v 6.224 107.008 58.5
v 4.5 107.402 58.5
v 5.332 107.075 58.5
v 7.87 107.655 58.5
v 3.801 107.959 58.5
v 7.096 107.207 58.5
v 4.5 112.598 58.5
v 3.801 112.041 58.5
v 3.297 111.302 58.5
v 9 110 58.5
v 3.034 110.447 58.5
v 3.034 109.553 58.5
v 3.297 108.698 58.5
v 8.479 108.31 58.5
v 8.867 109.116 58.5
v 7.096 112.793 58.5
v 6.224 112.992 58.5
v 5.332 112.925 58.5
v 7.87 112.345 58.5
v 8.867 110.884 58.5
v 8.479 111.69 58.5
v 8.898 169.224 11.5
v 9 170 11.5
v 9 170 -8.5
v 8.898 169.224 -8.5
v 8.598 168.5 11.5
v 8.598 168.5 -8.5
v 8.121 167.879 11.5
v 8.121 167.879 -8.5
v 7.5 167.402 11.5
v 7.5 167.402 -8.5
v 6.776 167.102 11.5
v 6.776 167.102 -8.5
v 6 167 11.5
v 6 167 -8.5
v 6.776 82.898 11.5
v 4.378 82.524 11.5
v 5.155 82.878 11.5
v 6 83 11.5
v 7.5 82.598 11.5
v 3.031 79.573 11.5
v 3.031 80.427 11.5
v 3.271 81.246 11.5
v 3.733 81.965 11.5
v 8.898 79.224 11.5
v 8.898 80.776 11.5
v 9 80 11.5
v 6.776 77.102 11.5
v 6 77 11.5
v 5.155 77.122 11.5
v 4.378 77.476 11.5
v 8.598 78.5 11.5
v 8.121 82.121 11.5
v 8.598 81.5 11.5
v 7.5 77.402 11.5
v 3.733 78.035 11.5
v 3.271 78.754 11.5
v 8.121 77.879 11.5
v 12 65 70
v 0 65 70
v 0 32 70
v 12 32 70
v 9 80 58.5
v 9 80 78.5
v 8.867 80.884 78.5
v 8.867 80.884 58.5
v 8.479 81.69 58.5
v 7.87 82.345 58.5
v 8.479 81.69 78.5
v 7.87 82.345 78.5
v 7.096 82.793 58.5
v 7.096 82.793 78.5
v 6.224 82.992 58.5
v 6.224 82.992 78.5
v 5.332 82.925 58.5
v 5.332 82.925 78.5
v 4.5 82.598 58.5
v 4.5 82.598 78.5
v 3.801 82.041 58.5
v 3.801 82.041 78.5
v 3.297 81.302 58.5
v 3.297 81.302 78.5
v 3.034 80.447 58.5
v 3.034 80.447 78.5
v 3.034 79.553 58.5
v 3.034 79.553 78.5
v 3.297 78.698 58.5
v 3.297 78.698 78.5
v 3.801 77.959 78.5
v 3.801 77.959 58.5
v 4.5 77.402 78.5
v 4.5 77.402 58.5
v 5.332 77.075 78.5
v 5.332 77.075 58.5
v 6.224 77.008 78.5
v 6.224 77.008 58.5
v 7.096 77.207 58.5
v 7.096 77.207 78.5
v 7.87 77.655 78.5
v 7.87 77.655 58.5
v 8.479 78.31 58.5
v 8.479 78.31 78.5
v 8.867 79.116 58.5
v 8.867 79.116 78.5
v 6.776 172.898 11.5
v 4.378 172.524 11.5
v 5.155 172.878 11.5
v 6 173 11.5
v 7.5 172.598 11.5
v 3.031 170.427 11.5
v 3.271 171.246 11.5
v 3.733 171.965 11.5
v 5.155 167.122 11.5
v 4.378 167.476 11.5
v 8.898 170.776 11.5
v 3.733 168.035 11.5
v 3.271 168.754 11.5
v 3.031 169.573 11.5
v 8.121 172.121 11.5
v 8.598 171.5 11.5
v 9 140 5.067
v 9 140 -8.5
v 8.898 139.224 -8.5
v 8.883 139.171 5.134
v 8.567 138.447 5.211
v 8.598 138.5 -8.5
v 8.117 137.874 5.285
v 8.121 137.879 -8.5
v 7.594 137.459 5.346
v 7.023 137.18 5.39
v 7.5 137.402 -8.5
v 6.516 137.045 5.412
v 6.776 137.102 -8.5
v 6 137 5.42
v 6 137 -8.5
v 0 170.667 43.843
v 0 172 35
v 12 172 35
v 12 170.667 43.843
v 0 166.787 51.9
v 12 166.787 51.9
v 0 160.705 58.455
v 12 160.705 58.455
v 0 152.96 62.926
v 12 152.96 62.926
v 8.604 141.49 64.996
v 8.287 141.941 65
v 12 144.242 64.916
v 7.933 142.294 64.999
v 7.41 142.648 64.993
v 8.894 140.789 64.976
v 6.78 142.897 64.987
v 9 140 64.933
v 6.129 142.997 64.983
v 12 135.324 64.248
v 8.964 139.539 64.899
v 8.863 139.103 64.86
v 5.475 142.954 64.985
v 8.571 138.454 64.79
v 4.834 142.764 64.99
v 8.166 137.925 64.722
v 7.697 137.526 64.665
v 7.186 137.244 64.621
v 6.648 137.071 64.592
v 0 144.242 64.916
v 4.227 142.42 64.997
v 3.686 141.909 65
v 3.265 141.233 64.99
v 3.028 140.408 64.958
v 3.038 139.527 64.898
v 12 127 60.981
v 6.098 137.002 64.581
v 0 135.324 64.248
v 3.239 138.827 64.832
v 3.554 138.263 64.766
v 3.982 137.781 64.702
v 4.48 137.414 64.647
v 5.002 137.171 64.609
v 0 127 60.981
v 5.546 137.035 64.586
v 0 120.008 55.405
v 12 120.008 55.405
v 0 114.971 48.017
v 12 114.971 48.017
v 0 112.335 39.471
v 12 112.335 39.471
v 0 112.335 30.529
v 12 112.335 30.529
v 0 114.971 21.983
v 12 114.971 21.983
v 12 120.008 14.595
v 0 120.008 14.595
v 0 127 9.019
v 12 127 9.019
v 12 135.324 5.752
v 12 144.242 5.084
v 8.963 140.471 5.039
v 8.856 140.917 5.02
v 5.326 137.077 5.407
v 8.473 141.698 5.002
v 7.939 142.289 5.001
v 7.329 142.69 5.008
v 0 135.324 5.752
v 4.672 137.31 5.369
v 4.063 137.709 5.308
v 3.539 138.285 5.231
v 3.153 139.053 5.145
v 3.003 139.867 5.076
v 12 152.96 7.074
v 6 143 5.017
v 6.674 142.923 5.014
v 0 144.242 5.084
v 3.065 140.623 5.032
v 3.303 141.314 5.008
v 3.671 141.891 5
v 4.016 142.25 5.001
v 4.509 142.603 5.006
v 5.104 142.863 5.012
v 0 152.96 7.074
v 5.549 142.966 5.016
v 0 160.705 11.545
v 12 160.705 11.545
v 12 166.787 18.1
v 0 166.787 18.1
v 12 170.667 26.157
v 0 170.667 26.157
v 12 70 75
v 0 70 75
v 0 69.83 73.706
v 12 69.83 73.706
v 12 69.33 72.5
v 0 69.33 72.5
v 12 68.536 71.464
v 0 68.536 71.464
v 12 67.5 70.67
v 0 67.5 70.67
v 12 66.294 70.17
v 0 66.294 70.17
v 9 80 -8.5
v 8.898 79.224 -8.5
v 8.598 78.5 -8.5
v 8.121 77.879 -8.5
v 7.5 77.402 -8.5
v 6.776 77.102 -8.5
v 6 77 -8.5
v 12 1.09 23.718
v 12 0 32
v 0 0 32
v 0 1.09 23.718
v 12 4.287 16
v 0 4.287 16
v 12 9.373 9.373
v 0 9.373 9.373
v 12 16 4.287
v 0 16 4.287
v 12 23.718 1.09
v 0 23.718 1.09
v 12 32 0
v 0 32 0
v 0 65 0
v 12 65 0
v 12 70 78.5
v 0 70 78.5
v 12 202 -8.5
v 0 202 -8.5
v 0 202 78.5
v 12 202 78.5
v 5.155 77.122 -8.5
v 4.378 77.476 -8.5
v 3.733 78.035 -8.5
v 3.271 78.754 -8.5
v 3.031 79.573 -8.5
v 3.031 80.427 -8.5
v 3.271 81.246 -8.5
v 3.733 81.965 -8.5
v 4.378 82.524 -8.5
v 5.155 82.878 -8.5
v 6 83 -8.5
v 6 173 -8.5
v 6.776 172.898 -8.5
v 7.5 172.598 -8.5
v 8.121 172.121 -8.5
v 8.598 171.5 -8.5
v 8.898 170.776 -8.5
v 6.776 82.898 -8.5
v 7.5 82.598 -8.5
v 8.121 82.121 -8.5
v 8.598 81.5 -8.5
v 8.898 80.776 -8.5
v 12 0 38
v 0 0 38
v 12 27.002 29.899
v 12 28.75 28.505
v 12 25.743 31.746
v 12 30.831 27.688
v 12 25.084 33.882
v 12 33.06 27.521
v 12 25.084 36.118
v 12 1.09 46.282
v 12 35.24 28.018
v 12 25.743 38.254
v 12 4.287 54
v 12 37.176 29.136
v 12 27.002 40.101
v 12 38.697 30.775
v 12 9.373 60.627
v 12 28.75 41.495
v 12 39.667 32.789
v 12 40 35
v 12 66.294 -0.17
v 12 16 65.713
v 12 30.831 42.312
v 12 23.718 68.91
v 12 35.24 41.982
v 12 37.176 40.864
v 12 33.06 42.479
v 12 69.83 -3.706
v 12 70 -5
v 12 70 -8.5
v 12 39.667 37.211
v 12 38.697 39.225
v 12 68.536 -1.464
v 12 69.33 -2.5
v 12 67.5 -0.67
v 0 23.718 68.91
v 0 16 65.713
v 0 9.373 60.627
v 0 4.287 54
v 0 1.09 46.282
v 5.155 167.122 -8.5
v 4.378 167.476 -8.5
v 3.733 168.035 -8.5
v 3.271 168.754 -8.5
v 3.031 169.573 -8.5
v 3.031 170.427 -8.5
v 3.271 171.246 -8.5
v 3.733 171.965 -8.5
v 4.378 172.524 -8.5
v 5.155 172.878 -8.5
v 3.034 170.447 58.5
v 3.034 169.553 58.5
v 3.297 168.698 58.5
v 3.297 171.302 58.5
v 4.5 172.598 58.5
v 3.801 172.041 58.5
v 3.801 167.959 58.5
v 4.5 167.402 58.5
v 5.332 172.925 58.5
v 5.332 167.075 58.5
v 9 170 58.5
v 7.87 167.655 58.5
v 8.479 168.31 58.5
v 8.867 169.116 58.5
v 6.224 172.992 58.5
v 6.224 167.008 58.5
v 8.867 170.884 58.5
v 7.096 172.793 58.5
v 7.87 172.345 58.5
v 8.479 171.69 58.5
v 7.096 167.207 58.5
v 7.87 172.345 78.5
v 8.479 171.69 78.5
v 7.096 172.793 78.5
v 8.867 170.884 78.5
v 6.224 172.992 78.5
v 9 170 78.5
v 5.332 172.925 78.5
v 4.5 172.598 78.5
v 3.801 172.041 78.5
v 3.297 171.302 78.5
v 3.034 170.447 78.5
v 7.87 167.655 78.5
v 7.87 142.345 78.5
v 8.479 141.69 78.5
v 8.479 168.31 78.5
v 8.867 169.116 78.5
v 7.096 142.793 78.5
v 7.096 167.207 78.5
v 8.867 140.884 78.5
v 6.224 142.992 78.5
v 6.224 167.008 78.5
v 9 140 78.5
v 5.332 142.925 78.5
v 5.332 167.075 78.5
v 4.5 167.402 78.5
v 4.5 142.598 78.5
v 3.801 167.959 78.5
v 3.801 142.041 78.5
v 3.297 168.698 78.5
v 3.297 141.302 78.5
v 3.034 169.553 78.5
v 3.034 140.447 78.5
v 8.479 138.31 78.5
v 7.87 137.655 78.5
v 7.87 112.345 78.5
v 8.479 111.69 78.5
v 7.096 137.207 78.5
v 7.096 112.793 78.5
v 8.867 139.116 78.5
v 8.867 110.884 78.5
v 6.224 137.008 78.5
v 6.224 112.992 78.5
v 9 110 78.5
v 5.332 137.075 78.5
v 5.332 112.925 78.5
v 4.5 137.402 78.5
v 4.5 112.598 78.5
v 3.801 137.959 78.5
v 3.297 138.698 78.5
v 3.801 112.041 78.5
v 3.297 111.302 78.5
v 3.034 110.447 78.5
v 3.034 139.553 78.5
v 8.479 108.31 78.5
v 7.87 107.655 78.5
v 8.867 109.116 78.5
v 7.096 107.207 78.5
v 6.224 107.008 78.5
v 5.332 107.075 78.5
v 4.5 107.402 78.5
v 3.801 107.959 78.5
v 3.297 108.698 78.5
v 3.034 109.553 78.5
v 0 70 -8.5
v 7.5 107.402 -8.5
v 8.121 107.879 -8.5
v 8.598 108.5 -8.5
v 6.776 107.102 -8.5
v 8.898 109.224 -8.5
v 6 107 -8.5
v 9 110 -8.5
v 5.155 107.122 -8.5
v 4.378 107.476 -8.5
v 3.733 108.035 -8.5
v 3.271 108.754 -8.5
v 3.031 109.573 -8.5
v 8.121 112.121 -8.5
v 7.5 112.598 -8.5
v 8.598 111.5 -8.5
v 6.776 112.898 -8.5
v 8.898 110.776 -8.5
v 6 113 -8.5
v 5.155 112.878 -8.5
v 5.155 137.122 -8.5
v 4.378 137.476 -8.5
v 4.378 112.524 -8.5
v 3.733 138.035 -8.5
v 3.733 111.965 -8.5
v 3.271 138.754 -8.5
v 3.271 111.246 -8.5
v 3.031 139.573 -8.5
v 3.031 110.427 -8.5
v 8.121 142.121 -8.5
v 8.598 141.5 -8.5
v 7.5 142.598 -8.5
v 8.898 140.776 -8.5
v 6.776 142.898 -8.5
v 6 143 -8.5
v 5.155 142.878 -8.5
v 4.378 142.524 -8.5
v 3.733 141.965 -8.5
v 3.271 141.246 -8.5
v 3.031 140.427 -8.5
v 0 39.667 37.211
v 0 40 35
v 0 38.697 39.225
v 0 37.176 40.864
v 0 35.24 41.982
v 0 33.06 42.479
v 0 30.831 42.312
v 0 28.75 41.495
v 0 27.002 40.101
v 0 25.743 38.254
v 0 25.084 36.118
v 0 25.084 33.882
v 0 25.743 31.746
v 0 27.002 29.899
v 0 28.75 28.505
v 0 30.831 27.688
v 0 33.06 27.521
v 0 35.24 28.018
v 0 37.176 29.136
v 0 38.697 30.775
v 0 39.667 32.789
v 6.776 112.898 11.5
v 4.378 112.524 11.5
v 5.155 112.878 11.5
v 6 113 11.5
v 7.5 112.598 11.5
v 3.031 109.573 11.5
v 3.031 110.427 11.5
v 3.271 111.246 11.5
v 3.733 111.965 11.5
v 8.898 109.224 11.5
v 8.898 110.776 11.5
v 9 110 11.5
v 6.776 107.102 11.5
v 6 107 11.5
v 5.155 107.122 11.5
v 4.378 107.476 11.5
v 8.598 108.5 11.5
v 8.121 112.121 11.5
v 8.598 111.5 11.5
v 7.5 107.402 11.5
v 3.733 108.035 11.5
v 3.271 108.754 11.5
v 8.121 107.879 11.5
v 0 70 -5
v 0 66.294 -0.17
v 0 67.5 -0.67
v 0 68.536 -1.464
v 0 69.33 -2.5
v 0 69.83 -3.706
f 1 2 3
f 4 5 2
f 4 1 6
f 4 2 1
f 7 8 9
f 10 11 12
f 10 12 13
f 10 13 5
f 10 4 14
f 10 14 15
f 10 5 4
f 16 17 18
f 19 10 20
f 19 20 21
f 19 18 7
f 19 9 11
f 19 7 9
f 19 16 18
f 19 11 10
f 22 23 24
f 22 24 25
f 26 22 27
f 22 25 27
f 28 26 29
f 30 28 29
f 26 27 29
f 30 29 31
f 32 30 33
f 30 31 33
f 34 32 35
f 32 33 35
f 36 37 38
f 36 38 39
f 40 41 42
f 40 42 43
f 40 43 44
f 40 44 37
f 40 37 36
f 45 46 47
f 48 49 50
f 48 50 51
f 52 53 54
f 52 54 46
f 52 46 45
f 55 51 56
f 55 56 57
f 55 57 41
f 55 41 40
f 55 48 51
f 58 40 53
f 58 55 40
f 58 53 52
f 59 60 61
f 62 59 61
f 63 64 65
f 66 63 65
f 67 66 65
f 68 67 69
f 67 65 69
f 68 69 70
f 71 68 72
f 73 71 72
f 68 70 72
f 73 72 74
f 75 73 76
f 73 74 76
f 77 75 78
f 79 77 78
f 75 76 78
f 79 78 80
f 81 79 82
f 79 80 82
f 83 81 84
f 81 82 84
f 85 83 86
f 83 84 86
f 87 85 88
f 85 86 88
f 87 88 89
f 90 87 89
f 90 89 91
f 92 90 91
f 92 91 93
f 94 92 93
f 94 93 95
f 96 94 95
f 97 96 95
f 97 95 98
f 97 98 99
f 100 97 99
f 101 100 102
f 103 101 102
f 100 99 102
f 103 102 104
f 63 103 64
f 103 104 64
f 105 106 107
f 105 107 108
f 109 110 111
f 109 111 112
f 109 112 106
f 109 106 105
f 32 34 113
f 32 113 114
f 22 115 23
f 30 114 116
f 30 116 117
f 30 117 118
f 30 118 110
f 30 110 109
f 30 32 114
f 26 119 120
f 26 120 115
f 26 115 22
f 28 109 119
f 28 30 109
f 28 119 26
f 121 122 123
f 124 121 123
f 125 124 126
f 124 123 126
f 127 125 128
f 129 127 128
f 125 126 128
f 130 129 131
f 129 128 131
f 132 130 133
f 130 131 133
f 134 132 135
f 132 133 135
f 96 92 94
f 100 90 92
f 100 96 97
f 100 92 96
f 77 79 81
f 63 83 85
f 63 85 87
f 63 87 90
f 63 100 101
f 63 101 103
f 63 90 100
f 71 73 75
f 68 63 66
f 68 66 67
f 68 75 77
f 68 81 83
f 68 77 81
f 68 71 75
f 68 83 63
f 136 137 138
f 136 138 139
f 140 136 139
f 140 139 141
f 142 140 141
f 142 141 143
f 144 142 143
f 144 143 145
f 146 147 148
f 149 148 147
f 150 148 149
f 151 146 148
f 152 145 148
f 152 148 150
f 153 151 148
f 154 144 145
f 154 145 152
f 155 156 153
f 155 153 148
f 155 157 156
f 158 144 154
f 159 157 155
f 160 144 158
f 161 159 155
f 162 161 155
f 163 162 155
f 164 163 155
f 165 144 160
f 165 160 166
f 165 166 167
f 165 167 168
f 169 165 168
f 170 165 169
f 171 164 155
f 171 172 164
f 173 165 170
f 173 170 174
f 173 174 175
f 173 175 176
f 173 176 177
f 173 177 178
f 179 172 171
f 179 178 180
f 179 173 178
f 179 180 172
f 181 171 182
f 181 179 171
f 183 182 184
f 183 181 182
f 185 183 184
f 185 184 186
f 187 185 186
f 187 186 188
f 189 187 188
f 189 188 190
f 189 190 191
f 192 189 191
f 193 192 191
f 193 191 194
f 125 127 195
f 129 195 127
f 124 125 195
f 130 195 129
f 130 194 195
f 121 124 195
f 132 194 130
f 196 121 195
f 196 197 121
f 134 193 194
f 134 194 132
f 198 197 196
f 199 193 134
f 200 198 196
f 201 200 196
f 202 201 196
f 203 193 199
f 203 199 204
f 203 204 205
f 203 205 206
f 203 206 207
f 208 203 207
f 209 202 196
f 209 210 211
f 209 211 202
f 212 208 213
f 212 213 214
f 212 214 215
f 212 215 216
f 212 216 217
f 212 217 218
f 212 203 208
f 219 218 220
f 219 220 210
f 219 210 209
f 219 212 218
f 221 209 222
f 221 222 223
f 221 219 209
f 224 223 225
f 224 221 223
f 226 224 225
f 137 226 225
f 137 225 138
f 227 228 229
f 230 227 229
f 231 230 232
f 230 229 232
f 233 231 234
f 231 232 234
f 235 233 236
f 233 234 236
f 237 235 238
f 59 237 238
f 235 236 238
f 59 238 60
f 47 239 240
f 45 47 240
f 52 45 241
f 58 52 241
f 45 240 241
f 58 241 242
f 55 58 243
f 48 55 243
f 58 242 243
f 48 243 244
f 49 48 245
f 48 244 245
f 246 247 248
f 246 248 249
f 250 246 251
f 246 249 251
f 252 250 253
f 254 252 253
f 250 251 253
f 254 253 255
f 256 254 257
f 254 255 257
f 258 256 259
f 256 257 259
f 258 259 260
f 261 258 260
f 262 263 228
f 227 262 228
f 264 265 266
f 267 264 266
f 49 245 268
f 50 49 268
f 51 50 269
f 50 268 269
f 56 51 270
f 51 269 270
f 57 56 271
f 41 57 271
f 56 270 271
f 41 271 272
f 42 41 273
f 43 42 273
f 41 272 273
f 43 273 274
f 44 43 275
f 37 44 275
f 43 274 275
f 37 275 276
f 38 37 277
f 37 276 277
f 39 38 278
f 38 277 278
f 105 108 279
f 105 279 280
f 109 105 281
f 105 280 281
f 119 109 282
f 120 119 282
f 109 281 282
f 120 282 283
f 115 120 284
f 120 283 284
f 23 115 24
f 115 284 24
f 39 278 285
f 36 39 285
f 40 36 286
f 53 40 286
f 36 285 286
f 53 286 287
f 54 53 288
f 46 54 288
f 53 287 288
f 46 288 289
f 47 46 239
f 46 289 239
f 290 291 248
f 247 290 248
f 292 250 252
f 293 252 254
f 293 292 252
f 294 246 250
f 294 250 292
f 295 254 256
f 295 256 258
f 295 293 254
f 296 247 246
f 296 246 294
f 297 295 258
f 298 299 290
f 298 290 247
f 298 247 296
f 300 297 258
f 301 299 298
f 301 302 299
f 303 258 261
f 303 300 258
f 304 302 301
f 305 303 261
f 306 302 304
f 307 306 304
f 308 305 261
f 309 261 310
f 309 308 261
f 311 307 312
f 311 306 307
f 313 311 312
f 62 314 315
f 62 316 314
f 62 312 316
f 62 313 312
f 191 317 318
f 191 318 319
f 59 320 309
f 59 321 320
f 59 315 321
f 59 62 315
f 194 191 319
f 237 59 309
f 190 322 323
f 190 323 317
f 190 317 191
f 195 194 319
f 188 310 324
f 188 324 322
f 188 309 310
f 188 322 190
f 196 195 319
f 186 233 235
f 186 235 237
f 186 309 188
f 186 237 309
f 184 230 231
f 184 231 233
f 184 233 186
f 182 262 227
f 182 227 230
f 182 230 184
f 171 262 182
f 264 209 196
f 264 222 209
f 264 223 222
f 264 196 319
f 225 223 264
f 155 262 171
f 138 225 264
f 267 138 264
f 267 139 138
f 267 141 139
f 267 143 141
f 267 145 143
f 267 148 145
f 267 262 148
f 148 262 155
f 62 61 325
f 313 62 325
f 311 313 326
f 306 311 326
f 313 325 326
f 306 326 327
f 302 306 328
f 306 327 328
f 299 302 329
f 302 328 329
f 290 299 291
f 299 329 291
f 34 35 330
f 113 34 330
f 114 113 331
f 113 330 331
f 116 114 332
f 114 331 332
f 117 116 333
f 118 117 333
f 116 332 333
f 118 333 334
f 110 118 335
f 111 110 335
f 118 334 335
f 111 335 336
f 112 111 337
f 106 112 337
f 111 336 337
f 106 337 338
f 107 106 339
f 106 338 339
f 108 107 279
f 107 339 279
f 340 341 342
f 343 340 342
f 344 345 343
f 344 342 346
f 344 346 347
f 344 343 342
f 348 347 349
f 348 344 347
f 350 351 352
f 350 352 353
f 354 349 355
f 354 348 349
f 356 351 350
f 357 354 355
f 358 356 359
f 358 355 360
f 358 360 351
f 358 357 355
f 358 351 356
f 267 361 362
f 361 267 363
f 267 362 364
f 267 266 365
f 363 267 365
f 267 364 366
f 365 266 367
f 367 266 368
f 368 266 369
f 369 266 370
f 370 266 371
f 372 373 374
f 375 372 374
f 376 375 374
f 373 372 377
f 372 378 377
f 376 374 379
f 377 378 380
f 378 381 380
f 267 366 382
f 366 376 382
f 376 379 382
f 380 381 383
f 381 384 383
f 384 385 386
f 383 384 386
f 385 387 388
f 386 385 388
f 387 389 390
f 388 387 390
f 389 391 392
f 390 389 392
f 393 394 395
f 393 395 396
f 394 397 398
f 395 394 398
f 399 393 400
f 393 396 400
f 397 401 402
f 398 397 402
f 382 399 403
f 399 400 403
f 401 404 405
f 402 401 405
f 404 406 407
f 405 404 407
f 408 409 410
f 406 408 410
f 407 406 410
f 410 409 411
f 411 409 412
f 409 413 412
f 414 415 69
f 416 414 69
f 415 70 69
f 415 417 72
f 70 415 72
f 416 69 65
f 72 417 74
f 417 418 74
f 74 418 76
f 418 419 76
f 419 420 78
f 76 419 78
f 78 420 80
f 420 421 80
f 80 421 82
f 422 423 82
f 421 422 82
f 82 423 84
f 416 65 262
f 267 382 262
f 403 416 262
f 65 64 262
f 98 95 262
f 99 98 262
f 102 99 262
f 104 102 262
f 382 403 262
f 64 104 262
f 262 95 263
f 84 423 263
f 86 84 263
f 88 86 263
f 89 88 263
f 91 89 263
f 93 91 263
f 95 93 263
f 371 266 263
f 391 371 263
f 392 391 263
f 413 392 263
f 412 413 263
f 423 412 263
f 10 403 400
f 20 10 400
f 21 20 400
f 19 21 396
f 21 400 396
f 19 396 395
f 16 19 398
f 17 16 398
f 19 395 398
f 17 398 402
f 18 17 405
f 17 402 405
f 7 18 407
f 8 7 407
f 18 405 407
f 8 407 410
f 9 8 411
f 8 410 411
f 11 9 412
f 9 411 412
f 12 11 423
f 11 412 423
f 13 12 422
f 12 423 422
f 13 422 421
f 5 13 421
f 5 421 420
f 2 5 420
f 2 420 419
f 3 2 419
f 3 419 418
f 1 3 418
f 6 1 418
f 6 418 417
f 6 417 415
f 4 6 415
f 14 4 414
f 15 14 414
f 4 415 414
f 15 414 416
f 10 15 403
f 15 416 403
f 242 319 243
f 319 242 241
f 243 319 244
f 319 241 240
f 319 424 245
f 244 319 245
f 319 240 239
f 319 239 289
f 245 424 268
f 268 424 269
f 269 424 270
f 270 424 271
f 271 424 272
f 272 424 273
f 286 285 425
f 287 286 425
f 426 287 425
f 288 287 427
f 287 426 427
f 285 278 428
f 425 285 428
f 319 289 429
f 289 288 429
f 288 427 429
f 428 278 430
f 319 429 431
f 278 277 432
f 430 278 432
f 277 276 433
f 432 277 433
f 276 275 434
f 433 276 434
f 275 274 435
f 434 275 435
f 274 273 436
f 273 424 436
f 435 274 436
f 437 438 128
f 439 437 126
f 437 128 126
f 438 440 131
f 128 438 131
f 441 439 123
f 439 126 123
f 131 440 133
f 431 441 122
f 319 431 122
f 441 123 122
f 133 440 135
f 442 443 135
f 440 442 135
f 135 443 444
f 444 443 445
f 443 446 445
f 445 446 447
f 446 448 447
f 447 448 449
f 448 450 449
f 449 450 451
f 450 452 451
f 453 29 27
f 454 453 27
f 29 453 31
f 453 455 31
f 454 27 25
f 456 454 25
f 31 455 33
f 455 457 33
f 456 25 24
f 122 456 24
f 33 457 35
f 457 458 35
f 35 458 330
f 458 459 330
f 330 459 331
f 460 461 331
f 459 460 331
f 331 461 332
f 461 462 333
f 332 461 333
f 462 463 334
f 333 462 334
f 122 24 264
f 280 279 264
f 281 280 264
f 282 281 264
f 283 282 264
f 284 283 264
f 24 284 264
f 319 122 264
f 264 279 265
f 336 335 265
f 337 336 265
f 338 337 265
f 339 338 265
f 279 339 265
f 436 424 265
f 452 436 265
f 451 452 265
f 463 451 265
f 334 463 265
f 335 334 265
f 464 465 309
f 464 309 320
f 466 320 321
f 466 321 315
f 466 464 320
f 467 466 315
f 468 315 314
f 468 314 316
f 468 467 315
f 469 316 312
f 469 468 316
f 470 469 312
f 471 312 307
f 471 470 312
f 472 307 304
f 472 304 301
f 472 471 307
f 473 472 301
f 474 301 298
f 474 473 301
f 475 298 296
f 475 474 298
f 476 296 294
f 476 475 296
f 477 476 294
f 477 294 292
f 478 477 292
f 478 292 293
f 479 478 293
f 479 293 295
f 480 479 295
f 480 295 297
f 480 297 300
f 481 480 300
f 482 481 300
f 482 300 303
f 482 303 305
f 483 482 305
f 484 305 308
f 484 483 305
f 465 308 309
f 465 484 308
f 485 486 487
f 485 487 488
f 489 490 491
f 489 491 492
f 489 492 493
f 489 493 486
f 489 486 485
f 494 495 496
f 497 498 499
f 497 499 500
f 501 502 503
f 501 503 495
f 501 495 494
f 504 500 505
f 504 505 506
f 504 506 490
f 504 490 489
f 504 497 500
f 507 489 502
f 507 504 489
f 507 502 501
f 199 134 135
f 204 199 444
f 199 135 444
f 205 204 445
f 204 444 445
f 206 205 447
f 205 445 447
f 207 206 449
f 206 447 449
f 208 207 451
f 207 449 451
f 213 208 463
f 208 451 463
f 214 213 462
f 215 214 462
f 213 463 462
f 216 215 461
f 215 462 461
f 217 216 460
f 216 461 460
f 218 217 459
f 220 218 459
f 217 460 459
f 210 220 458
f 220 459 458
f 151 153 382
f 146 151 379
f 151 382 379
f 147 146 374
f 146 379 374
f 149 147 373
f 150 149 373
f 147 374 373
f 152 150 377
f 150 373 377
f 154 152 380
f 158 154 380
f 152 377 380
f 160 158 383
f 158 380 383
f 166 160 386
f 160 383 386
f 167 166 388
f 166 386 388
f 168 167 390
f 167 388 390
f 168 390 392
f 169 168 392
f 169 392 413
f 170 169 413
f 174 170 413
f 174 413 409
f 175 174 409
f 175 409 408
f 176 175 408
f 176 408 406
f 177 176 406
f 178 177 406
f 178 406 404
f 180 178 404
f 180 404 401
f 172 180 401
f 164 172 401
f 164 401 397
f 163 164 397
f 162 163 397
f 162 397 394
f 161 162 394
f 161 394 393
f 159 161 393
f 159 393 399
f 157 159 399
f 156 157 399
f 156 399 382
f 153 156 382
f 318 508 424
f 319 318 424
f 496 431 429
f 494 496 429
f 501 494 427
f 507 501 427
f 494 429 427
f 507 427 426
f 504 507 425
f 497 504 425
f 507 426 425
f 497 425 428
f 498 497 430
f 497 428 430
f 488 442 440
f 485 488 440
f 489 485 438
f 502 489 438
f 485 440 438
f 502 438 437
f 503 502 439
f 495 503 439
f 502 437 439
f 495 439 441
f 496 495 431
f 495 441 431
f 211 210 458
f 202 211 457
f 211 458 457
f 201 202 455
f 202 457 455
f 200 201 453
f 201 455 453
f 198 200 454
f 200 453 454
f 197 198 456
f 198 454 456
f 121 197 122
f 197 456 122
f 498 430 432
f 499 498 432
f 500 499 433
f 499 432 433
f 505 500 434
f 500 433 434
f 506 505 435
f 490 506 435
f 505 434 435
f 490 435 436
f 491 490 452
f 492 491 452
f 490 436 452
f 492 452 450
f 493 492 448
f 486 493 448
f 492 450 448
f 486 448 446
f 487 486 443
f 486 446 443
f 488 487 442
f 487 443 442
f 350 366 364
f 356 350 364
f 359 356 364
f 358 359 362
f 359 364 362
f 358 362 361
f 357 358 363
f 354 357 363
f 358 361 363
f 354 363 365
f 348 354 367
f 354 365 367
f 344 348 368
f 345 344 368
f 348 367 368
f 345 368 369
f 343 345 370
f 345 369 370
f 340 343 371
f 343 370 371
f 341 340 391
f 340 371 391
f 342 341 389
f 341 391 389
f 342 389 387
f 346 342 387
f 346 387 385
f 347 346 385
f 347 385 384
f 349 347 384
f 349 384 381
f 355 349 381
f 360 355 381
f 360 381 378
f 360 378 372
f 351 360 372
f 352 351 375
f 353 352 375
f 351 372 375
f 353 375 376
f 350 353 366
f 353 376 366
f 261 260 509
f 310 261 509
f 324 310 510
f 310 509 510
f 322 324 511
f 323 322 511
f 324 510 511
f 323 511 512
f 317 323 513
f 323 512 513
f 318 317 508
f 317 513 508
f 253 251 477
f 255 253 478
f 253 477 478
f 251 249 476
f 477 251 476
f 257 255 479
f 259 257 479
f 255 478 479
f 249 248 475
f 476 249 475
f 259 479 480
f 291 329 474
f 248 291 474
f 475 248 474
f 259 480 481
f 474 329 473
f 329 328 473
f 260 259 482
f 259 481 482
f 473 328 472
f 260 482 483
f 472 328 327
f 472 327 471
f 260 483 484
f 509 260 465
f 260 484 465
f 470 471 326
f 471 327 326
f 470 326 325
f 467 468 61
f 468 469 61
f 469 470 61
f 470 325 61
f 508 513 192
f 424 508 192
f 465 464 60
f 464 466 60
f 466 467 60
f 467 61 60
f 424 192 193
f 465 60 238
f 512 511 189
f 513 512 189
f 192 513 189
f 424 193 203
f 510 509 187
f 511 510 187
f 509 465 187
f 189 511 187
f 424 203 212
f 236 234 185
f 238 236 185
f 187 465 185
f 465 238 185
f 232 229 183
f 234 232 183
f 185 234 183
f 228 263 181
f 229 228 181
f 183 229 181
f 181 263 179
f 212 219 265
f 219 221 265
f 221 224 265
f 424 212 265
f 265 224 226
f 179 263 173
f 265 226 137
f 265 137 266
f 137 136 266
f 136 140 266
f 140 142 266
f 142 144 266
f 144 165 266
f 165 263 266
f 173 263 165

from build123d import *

# Parameters (mm, degrees)
F0_R     = 7.5
F0_R_2   = 30
F1_DEPTH = 12
F2_R     = 3
F3_DEPTH = 20
F5_DEPTH = 20


with BuildPart() as f1:
    # F0 (on Right) → F1 (new body)
    with BuildSketch(Plane.YZ):
        with BuildLine():
            ThreePointArc((0, 32), (9.372583, 9.372583), (32, 0))
            Line((32, 0), (65, 0))
            ThreePointArc((65, 0), (68.535534, -1.464466), (70, -5))
            Line((70, -5), (70, -8.5))
            Line((70, -8.5), (202, -8.5))
            Line((202, -8.5), (202, 78.5))
            Line((202, 78.5), (70, 78.5))
            Line((70, 78.5), (70, 75))
            ThreePointArc((70, 75), (68.535534, 71.464466), (65, 70))
            Line((65, 70), (32, 70))
            ThreePointArc((32, 70), (9.372583, 60.627417), (0, 38))
            Line((0, 38), (0, 32))
        make_face()
        with Locations((32.5, 35)):
            Circle(F0_R, mode=Mode.SUBTRACT)
        with Locations((142, 35)):
            Circle(F0_R_2, mode=Mode.SUBTRACT)
    extrude(amount=F1_DEPTH)

    # F2 (on face) → F3 (cut)
    with BuildSketch(Plane.XY.offset(78.5)):
        with Locations((6, 80)):
            Circle(F2_R)
        with Locations((6, 110)):
            Circle(F2_R)
        with Locations((6, 140)):
            Circle(F2_R)
        with Locations((6, 170)):
            Circle(F2_R)
    extrude(amount=-F3_DEPTH, mode=Mode.SUBTRACT)

    # F4 (on face) → F5 (cut)
    with BuildSketch(Plane(origin=(0, 0, -8.5), x_dir=(1, 0, 0), z_dir=(0, 0, -1))):
        with BuildLine():
            ThreePointArc((6, -167), (3, -170), (6, -173))
            Line((6, -173), (6, -167))
        make_face()
        with BuildLine():
            ThreePointArc((6, -77), (3, -80), (6, -83))
            Line((6, -83), (6, -80))
            Line((6, -80), (6, -77))
        make_face()
        with BuildLine():
            Line((6, -80), (6, -83))
            ThreePointArc((6, -83), (8.12132, -82.12132), (9, -80))
            Line((9, -80), (6, -80))
        make_face()
        with BuildLine():
            ThreePointArc((6, -107), (3, -110), (6, -113))
            Line((6, -113), (6, -110))
            Line((6, -110), (6, -107))
        make_face()
        with BuildLine():
            Line((6, -110), (6, -113))
            ThreePointArc((6, -113), (8.12132, -112.12132), (9, -110))
            ThreePointArc((9, -110), (8.12132, -107.87868), (6, -107))
            Line((6, -107), (6, -110))
        make_face()
        with BuildLine():
            ThreePointArc((6, -137), (3, -140), (6, -143))
            Line((6, -143), (6, -137))
        make_face()
        with BuildLine():
            Line((6, -137), (6, -143))
            ThreePointArc((6, -143), (8.12132, -142.12132), (9, -140))
            ThreePointArc((9, -140), (8.12132, -137.87868), (6, -137))
        make_face()
        with BuildLine():
            Line((6, -167), (6, -173))
            ThreePointArc((6, -173), (8.12132, -172.12132), (9, -170))
            ThreePointArc((9, -170), (8.12132, -167.87868), (6, -167))
        make_face()
        with BuildLine():
            Line((6, -77), (6, -80))
            Line((6, -80), (9, -80))
            ThreePointArc((9, -80), (8.12132, -77.87868), (6, -77))
        make_face()
    extrude(amount=-F5_DEPTH, mode=Mode.SUBTRACT)


solid = f1.part
